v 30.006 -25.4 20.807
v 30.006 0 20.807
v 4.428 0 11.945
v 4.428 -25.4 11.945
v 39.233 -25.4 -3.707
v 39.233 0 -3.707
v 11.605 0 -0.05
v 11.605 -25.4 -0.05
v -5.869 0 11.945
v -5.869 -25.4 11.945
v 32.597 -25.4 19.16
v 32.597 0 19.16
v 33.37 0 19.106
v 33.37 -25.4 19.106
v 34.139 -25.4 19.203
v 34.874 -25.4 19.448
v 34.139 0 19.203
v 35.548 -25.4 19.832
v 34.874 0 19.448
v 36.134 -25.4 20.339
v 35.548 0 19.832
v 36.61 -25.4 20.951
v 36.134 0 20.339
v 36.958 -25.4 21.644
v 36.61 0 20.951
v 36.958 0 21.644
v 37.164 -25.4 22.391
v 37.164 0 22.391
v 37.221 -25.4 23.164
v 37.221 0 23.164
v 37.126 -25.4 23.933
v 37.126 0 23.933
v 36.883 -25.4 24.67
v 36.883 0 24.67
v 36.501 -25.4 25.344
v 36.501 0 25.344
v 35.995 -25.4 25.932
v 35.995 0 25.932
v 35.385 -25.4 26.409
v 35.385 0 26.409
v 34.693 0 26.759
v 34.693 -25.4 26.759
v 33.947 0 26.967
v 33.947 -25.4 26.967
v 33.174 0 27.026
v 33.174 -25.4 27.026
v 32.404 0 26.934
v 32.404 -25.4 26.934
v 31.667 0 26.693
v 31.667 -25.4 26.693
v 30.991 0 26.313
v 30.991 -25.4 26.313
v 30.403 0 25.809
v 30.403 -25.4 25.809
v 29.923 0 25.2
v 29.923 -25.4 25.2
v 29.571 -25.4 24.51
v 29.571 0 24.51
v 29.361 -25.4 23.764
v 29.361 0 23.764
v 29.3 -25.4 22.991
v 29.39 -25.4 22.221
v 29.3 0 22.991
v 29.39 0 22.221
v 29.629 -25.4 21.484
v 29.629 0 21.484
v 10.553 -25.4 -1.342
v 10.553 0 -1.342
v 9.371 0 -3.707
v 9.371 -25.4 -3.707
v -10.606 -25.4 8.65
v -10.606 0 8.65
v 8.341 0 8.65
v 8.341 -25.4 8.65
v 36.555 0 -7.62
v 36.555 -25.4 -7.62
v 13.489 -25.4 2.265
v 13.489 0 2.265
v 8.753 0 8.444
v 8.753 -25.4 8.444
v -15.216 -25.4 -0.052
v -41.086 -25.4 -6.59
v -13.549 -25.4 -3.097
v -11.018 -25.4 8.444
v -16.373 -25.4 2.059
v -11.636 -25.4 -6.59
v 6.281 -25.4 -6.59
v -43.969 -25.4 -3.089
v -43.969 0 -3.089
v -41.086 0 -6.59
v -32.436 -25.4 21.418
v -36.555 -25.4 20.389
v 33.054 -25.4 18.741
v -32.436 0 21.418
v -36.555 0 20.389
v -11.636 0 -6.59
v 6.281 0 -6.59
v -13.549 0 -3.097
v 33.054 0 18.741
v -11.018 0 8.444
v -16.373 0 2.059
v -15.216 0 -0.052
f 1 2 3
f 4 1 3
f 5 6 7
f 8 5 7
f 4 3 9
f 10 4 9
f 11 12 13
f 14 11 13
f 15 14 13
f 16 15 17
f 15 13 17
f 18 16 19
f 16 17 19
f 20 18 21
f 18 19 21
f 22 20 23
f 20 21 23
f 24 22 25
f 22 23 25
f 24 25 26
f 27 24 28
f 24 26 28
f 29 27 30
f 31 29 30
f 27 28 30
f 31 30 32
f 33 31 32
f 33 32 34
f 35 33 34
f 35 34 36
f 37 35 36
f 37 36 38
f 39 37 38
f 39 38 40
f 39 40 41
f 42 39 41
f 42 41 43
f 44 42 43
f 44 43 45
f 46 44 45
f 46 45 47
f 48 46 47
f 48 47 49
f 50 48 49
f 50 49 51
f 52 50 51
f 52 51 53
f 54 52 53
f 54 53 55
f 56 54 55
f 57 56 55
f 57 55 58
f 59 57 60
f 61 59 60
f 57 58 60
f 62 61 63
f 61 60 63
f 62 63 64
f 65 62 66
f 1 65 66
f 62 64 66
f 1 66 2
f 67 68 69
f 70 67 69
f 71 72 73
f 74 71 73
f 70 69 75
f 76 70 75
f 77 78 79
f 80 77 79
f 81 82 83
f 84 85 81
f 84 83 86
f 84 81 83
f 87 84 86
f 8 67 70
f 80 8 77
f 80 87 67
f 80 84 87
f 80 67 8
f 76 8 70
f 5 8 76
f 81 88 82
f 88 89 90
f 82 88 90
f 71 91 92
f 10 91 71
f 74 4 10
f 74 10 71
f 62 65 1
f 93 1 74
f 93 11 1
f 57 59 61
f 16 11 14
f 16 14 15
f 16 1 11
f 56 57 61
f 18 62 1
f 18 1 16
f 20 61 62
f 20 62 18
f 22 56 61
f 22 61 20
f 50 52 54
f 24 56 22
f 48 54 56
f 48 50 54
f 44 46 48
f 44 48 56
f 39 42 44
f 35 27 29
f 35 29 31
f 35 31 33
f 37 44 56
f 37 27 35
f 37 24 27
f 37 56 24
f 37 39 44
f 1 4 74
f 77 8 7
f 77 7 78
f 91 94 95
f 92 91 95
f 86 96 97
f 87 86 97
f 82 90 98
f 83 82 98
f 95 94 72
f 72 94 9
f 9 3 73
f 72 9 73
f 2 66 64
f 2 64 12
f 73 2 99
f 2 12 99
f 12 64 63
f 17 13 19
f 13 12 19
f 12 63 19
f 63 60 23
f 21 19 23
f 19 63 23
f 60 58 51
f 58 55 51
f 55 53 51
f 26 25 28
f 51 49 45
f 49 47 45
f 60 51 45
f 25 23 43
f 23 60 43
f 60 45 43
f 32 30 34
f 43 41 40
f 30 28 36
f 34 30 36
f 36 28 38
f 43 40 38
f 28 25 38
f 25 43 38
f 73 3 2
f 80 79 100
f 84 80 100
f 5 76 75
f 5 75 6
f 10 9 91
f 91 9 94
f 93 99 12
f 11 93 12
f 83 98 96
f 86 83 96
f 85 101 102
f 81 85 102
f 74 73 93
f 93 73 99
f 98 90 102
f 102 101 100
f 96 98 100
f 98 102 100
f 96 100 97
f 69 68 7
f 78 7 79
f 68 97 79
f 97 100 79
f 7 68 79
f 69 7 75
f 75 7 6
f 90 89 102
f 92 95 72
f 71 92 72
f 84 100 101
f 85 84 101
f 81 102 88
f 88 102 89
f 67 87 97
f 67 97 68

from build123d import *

# Parameters (mm, degrees)
F2_R      = 3.9614488342
F3_DEPTH  = 25.4
F5_DEPTH  = 25.4
F7_DEPTH  = 25.4
F9_DEPTH  = 25.4
F11_DEPTH = 25.4


# Not quite as in the source:
# - the program builds the solid bodies; features that only make, move or delete a surface that nothing else refers to are left out


with BuildPart() as f3:
    # F2 (on Front) → F3 (new body)
    with BuildSketch(Plane.XZ):
        with Locations((33.2602709532, 23.0659469962)):
            Circle(F2_R)
    extrude(amount=F3_DEPTH)

    # F4 (on Front) → F5 (join)
    with BuildSketch(Plane.XZ):
        Polygon((-5.8694598265, 11.9448658079), (-32.4364863336, 21.4183777571), (-36.5554057062, 20.3886479139), (-10.6062162668, 8.6497301236), (8.3408113569, 8.6497301236), (33.0543257296, 18.7410805374), (30.5829718709, 21.0064873099), (4.4278376736, 11.9448658079), align=None)
    extrude(amount=F5_DEPTH)


with BuildPart() as f7:
    # F6 (on Front) → F7 (new body)
    with BuildSketch(Plane.XZ):
        Polygon((8.7527008727, 8.4437839687), (-11.0181085765, 8.4437839687), (-16.3727030158, 2.0594594534), (-11.6359470412, -6.5902704373), (6.2813521363, -6.5902704373), (13.4894605726, 2.2654053755), align=None)
    extrude(amount=F7_DEPTH)

    # F8 (on Front) → F9 (join)
    with BuildSketch(Plane.XZ):
        Polygon((-13.4894596413, -3.0891890638), (-14.7251356393, 0), (-43.9694598317, -3.0891890638), (-41.0862155259, -6.5902704373), align=None)
    extrude(amount=F9_DEPTH)

    # F10 (on Front) → F11 (join)
    with BuildSketch(Plane.XZ):
        Polygon((39.2327047884, -3.7070270628), (11.2240547314, 0), (9.3705402687, -3.7070270628), (36.5554057062, -7.6200002804), align=None)
    extrude(amount=F11_DEPTH)


solid = Compound([f3.part, f7.part])
